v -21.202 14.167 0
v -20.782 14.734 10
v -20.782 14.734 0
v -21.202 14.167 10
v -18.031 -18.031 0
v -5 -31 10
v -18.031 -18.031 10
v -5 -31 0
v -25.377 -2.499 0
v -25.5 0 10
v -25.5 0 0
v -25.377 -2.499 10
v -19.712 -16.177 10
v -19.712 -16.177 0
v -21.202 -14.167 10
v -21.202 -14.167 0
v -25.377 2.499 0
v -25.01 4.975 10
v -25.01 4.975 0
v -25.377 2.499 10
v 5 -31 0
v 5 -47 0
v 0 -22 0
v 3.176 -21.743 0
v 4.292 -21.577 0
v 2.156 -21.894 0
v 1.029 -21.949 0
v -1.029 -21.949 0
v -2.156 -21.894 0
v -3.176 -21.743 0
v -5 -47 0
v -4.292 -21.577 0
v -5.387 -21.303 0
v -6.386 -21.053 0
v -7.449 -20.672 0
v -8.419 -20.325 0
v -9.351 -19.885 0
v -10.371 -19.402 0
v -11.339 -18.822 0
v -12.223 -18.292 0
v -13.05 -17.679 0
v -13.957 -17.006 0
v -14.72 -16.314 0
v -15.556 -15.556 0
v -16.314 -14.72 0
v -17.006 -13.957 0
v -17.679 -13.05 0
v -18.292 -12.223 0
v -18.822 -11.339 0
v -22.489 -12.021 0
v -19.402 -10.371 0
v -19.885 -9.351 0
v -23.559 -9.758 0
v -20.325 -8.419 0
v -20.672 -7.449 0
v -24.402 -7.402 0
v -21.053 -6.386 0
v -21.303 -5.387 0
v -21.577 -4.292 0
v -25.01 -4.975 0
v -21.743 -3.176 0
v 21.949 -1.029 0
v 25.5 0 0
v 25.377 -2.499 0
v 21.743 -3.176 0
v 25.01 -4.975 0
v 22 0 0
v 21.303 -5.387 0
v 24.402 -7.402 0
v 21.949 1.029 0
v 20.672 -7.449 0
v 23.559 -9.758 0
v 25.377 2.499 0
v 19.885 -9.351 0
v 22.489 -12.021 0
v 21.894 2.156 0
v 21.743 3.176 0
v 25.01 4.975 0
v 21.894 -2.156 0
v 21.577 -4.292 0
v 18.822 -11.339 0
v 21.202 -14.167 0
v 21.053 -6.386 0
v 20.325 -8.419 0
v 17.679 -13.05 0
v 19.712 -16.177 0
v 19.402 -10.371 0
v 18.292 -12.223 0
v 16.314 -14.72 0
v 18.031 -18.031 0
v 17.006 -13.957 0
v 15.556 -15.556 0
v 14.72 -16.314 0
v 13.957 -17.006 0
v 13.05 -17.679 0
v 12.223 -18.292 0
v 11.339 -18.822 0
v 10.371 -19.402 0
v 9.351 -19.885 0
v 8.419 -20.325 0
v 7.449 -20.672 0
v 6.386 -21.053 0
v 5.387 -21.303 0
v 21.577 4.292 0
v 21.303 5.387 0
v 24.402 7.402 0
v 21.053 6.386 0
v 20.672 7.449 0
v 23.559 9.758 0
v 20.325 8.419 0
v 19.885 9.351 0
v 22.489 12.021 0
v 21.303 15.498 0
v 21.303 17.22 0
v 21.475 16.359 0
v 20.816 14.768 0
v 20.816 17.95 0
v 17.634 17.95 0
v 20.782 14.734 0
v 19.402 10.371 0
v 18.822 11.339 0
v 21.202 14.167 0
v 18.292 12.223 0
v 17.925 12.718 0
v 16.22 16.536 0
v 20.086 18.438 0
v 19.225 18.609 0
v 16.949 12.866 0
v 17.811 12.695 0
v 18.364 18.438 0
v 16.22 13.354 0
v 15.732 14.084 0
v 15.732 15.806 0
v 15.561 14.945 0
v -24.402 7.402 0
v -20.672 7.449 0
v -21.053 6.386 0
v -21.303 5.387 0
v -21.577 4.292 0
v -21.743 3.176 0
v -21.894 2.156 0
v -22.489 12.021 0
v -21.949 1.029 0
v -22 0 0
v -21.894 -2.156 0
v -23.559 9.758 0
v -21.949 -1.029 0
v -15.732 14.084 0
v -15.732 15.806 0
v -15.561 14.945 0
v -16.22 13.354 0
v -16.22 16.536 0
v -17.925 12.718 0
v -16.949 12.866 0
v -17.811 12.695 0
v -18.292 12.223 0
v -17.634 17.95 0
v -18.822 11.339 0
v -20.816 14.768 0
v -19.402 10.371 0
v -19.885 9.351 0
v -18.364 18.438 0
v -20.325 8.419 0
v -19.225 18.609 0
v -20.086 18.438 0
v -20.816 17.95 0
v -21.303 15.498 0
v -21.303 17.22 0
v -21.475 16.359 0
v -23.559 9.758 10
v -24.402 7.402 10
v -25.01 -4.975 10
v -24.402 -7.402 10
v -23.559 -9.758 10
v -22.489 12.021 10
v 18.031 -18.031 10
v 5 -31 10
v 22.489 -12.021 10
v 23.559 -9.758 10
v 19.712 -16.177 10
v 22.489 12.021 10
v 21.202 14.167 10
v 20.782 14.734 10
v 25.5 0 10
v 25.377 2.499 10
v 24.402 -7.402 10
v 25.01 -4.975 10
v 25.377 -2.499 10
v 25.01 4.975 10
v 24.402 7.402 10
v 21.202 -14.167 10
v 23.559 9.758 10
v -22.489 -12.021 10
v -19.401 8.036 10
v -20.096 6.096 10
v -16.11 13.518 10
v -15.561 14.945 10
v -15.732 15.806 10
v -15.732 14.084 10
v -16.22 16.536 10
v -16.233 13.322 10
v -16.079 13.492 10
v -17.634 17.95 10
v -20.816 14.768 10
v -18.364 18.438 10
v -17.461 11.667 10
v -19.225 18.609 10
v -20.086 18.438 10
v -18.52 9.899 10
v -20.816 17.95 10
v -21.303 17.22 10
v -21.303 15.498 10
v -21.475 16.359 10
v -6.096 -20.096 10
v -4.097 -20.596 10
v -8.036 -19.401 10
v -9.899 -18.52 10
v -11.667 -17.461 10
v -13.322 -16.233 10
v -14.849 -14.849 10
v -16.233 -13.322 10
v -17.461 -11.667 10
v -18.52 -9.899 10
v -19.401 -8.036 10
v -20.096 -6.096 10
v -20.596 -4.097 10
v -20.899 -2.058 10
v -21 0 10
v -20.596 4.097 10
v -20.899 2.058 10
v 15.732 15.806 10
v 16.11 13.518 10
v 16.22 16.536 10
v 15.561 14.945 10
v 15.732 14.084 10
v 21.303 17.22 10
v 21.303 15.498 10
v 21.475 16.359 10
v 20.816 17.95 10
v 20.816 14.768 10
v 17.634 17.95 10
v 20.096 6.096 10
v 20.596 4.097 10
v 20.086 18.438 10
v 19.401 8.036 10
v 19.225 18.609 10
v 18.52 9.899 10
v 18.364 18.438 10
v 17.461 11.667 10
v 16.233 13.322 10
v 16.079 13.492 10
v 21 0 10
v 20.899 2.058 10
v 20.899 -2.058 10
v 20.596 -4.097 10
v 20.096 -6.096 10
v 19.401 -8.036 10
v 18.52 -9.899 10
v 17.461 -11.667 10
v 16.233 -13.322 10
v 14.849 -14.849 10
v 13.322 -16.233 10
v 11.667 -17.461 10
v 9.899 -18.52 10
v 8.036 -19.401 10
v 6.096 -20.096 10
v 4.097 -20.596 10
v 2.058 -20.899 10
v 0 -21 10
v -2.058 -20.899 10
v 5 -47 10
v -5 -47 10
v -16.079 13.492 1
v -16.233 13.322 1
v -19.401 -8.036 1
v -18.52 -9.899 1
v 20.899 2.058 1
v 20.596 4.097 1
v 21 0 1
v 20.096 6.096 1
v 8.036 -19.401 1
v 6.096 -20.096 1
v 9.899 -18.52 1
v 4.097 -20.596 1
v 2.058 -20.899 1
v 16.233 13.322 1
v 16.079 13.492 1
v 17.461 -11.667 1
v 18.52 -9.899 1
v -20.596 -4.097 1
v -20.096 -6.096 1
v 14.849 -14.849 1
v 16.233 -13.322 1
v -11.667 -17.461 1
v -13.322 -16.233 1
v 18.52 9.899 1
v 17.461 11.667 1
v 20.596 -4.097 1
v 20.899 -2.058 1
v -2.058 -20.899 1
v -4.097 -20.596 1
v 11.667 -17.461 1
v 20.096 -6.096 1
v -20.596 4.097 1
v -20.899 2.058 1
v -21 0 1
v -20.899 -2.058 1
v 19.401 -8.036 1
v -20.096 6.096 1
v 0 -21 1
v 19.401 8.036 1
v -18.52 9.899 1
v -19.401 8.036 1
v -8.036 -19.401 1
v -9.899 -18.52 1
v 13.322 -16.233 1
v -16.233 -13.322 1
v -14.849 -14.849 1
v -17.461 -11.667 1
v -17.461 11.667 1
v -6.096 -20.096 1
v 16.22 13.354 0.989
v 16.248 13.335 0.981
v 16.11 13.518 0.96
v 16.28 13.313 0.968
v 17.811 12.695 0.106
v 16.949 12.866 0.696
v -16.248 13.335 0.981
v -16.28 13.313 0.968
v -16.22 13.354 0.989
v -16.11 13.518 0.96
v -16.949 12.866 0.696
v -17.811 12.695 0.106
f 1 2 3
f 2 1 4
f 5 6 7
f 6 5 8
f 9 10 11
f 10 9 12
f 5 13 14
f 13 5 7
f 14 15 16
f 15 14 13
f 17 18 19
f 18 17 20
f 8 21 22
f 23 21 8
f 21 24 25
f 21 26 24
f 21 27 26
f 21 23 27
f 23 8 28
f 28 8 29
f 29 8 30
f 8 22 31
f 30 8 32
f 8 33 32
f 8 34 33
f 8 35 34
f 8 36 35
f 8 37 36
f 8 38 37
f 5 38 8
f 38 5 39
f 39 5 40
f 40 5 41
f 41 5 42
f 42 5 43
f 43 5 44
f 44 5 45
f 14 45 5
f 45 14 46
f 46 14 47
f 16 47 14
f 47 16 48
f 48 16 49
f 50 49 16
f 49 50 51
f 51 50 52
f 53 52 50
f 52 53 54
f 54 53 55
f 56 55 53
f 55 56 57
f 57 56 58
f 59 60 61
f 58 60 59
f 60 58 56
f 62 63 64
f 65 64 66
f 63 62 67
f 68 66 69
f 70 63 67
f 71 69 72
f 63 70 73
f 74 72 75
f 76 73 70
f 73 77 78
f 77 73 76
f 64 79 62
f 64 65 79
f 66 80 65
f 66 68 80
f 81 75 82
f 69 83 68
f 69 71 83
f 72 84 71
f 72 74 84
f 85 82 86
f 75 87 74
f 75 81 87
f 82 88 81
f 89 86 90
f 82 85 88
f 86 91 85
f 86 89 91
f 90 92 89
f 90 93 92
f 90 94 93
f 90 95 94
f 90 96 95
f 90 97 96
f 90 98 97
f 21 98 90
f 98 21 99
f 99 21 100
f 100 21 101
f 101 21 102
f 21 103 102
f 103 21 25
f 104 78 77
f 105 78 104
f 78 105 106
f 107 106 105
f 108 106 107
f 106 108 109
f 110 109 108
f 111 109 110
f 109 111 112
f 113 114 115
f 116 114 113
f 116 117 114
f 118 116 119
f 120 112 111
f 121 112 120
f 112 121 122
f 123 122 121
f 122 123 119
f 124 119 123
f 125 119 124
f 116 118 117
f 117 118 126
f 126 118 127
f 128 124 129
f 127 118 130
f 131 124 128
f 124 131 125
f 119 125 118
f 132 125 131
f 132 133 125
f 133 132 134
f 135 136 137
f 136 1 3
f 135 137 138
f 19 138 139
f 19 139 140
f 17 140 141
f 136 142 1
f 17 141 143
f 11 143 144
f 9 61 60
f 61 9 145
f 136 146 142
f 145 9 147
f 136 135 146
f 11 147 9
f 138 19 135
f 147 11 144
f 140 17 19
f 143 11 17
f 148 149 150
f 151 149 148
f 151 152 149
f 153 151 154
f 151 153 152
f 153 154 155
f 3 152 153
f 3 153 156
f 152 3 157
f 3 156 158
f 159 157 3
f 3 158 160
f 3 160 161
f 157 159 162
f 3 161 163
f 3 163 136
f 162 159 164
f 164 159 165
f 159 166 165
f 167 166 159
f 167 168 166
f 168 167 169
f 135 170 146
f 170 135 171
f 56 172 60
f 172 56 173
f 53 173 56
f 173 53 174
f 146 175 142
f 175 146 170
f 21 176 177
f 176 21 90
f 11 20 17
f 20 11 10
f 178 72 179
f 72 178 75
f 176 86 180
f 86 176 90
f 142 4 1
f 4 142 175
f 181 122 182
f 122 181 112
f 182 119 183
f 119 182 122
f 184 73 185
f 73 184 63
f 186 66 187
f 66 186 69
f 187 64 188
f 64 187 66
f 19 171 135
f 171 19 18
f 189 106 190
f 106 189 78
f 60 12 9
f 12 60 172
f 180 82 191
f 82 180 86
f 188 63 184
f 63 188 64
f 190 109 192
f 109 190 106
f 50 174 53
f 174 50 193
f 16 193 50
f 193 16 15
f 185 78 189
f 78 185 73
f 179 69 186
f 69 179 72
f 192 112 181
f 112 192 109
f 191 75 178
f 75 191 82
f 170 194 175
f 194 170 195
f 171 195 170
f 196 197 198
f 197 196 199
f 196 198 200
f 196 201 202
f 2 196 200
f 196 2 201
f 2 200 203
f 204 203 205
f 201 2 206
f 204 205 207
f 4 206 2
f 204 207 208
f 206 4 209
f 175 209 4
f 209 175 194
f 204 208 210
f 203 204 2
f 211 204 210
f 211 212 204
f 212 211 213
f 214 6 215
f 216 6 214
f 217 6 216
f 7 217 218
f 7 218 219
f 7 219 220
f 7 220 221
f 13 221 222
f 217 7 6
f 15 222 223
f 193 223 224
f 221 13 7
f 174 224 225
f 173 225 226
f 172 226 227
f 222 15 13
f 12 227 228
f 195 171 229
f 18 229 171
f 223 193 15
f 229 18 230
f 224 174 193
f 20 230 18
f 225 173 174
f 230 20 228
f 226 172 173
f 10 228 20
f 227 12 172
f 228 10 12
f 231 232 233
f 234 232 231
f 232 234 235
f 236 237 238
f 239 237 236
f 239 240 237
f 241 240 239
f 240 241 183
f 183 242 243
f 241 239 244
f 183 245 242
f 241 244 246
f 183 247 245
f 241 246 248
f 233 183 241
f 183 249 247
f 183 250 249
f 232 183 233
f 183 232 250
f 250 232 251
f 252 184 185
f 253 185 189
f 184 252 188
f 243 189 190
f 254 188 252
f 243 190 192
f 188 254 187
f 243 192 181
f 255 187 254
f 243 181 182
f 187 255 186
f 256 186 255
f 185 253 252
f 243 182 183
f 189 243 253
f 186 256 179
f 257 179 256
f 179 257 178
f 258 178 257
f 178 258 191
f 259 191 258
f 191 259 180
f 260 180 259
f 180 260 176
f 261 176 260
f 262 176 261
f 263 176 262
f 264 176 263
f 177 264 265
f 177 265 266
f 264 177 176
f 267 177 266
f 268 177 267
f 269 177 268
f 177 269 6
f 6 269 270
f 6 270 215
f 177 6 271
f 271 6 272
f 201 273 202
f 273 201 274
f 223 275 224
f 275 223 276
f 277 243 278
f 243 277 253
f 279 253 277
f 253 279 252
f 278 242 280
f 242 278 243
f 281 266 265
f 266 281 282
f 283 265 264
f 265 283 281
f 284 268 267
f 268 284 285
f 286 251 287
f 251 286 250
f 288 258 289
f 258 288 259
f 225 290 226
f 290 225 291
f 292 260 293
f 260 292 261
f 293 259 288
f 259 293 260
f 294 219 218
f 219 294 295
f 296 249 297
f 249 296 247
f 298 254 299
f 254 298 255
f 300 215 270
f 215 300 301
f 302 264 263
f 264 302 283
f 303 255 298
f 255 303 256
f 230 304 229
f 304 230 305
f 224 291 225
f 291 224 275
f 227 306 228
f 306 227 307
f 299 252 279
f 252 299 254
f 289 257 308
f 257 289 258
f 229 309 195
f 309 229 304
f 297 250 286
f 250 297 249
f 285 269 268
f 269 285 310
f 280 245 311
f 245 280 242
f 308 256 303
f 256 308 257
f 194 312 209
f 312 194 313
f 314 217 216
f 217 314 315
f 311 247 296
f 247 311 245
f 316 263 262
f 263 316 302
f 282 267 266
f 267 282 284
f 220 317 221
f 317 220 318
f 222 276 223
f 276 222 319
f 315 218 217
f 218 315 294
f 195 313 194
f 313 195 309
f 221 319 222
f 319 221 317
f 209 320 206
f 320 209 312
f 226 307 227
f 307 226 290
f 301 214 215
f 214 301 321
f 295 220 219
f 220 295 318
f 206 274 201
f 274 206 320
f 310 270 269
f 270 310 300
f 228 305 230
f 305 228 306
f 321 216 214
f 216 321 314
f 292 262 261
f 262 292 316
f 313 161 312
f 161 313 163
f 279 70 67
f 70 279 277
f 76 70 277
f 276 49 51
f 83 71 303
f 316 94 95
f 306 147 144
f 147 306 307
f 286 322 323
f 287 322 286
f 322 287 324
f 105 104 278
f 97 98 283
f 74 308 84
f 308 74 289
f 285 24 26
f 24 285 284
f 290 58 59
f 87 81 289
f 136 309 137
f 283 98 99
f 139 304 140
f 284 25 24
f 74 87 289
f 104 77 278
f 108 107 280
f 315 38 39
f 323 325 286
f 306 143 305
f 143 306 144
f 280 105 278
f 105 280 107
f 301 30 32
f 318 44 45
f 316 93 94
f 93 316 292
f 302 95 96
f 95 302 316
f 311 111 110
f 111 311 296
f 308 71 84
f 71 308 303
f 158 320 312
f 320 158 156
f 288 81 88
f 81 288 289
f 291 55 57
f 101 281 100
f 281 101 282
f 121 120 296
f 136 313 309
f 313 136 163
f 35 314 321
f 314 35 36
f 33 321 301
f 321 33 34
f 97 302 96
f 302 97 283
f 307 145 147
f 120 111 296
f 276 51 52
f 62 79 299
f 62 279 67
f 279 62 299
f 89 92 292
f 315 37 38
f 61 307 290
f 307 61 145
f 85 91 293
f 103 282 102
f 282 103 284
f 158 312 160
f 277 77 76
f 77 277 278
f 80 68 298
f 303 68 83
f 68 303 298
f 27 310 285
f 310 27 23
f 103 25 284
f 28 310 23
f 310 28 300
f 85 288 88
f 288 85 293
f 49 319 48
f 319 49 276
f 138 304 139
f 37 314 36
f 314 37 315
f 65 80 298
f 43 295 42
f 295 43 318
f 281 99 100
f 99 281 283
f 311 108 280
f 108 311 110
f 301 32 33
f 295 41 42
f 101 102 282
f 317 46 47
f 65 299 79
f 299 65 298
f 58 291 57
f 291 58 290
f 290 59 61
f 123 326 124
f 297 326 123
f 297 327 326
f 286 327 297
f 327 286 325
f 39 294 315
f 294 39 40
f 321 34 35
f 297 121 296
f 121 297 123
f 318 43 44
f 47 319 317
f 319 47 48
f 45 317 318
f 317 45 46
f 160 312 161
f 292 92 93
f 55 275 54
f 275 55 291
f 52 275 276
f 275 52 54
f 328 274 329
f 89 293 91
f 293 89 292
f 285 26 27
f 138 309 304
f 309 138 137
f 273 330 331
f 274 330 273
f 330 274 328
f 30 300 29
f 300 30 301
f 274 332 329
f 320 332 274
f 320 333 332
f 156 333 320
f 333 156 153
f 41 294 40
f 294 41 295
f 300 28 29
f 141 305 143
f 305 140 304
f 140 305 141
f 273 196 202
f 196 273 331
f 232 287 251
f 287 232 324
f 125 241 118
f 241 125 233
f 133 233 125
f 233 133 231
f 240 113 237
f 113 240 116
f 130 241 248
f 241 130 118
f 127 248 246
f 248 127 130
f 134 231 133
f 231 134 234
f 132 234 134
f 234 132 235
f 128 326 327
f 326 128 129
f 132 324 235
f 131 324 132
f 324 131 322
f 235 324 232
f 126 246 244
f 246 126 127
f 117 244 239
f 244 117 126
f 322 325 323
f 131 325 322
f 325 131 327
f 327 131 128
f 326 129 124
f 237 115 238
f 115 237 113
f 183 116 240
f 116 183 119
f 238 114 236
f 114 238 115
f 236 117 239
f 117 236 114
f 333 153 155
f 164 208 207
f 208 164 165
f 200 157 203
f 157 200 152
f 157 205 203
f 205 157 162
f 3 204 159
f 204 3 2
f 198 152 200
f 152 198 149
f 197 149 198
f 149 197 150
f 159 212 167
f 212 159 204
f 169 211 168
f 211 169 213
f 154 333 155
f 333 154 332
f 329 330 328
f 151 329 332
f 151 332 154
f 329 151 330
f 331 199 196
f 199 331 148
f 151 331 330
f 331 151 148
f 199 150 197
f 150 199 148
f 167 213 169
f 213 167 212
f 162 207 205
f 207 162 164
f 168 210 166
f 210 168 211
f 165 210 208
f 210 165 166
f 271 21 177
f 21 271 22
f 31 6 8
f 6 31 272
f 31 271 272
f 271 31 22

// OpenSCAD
use <../utilities.scad>;

module cylinder_clip(r=1,t=3,opening_angle=120,wing_length=2,wing_angle=45,flat_w=10,flat_t=3,h=10,$fn=$fn){
	union(){
		difference(){
			hull(){
				cylinder(r=r+t,$fn=$fn,h=h);
				translate([-flat_w/2,-r-flat_t,0]) cube([flat_w,0.1,h]);
			}
			cylinder(r=r,$fn=$fn,h=99999,center=true);
			cylinder(r1=r+2,r2=r,$fn=$fn,h=2,center=true);
			scale([tan(opening_angle/2),1,1]) rotate([0,0,45]) translate([0,0,-1]) cube([1,1,1]*9999);
		}
		reflect([1,0,0]) translate([sin(opening_angle/2),cos(opening_angle/2),0]*(r+t/2)) hull() repeat([sin(wing_angle),cos(wing_angle),0]*wing_length,2)
			cylinder(r=t/2,h=h,$fn=16);
			
	}
}

//cylinder_clip(r=3,t=2,flat_w=6);
union(){
	cylinder_clip(r=21,t=4.5,flat_t=10,opening_angle=100,$fn=64);
	translate([-5,-22-5-20,0]) cube([10,20,10]);
}
